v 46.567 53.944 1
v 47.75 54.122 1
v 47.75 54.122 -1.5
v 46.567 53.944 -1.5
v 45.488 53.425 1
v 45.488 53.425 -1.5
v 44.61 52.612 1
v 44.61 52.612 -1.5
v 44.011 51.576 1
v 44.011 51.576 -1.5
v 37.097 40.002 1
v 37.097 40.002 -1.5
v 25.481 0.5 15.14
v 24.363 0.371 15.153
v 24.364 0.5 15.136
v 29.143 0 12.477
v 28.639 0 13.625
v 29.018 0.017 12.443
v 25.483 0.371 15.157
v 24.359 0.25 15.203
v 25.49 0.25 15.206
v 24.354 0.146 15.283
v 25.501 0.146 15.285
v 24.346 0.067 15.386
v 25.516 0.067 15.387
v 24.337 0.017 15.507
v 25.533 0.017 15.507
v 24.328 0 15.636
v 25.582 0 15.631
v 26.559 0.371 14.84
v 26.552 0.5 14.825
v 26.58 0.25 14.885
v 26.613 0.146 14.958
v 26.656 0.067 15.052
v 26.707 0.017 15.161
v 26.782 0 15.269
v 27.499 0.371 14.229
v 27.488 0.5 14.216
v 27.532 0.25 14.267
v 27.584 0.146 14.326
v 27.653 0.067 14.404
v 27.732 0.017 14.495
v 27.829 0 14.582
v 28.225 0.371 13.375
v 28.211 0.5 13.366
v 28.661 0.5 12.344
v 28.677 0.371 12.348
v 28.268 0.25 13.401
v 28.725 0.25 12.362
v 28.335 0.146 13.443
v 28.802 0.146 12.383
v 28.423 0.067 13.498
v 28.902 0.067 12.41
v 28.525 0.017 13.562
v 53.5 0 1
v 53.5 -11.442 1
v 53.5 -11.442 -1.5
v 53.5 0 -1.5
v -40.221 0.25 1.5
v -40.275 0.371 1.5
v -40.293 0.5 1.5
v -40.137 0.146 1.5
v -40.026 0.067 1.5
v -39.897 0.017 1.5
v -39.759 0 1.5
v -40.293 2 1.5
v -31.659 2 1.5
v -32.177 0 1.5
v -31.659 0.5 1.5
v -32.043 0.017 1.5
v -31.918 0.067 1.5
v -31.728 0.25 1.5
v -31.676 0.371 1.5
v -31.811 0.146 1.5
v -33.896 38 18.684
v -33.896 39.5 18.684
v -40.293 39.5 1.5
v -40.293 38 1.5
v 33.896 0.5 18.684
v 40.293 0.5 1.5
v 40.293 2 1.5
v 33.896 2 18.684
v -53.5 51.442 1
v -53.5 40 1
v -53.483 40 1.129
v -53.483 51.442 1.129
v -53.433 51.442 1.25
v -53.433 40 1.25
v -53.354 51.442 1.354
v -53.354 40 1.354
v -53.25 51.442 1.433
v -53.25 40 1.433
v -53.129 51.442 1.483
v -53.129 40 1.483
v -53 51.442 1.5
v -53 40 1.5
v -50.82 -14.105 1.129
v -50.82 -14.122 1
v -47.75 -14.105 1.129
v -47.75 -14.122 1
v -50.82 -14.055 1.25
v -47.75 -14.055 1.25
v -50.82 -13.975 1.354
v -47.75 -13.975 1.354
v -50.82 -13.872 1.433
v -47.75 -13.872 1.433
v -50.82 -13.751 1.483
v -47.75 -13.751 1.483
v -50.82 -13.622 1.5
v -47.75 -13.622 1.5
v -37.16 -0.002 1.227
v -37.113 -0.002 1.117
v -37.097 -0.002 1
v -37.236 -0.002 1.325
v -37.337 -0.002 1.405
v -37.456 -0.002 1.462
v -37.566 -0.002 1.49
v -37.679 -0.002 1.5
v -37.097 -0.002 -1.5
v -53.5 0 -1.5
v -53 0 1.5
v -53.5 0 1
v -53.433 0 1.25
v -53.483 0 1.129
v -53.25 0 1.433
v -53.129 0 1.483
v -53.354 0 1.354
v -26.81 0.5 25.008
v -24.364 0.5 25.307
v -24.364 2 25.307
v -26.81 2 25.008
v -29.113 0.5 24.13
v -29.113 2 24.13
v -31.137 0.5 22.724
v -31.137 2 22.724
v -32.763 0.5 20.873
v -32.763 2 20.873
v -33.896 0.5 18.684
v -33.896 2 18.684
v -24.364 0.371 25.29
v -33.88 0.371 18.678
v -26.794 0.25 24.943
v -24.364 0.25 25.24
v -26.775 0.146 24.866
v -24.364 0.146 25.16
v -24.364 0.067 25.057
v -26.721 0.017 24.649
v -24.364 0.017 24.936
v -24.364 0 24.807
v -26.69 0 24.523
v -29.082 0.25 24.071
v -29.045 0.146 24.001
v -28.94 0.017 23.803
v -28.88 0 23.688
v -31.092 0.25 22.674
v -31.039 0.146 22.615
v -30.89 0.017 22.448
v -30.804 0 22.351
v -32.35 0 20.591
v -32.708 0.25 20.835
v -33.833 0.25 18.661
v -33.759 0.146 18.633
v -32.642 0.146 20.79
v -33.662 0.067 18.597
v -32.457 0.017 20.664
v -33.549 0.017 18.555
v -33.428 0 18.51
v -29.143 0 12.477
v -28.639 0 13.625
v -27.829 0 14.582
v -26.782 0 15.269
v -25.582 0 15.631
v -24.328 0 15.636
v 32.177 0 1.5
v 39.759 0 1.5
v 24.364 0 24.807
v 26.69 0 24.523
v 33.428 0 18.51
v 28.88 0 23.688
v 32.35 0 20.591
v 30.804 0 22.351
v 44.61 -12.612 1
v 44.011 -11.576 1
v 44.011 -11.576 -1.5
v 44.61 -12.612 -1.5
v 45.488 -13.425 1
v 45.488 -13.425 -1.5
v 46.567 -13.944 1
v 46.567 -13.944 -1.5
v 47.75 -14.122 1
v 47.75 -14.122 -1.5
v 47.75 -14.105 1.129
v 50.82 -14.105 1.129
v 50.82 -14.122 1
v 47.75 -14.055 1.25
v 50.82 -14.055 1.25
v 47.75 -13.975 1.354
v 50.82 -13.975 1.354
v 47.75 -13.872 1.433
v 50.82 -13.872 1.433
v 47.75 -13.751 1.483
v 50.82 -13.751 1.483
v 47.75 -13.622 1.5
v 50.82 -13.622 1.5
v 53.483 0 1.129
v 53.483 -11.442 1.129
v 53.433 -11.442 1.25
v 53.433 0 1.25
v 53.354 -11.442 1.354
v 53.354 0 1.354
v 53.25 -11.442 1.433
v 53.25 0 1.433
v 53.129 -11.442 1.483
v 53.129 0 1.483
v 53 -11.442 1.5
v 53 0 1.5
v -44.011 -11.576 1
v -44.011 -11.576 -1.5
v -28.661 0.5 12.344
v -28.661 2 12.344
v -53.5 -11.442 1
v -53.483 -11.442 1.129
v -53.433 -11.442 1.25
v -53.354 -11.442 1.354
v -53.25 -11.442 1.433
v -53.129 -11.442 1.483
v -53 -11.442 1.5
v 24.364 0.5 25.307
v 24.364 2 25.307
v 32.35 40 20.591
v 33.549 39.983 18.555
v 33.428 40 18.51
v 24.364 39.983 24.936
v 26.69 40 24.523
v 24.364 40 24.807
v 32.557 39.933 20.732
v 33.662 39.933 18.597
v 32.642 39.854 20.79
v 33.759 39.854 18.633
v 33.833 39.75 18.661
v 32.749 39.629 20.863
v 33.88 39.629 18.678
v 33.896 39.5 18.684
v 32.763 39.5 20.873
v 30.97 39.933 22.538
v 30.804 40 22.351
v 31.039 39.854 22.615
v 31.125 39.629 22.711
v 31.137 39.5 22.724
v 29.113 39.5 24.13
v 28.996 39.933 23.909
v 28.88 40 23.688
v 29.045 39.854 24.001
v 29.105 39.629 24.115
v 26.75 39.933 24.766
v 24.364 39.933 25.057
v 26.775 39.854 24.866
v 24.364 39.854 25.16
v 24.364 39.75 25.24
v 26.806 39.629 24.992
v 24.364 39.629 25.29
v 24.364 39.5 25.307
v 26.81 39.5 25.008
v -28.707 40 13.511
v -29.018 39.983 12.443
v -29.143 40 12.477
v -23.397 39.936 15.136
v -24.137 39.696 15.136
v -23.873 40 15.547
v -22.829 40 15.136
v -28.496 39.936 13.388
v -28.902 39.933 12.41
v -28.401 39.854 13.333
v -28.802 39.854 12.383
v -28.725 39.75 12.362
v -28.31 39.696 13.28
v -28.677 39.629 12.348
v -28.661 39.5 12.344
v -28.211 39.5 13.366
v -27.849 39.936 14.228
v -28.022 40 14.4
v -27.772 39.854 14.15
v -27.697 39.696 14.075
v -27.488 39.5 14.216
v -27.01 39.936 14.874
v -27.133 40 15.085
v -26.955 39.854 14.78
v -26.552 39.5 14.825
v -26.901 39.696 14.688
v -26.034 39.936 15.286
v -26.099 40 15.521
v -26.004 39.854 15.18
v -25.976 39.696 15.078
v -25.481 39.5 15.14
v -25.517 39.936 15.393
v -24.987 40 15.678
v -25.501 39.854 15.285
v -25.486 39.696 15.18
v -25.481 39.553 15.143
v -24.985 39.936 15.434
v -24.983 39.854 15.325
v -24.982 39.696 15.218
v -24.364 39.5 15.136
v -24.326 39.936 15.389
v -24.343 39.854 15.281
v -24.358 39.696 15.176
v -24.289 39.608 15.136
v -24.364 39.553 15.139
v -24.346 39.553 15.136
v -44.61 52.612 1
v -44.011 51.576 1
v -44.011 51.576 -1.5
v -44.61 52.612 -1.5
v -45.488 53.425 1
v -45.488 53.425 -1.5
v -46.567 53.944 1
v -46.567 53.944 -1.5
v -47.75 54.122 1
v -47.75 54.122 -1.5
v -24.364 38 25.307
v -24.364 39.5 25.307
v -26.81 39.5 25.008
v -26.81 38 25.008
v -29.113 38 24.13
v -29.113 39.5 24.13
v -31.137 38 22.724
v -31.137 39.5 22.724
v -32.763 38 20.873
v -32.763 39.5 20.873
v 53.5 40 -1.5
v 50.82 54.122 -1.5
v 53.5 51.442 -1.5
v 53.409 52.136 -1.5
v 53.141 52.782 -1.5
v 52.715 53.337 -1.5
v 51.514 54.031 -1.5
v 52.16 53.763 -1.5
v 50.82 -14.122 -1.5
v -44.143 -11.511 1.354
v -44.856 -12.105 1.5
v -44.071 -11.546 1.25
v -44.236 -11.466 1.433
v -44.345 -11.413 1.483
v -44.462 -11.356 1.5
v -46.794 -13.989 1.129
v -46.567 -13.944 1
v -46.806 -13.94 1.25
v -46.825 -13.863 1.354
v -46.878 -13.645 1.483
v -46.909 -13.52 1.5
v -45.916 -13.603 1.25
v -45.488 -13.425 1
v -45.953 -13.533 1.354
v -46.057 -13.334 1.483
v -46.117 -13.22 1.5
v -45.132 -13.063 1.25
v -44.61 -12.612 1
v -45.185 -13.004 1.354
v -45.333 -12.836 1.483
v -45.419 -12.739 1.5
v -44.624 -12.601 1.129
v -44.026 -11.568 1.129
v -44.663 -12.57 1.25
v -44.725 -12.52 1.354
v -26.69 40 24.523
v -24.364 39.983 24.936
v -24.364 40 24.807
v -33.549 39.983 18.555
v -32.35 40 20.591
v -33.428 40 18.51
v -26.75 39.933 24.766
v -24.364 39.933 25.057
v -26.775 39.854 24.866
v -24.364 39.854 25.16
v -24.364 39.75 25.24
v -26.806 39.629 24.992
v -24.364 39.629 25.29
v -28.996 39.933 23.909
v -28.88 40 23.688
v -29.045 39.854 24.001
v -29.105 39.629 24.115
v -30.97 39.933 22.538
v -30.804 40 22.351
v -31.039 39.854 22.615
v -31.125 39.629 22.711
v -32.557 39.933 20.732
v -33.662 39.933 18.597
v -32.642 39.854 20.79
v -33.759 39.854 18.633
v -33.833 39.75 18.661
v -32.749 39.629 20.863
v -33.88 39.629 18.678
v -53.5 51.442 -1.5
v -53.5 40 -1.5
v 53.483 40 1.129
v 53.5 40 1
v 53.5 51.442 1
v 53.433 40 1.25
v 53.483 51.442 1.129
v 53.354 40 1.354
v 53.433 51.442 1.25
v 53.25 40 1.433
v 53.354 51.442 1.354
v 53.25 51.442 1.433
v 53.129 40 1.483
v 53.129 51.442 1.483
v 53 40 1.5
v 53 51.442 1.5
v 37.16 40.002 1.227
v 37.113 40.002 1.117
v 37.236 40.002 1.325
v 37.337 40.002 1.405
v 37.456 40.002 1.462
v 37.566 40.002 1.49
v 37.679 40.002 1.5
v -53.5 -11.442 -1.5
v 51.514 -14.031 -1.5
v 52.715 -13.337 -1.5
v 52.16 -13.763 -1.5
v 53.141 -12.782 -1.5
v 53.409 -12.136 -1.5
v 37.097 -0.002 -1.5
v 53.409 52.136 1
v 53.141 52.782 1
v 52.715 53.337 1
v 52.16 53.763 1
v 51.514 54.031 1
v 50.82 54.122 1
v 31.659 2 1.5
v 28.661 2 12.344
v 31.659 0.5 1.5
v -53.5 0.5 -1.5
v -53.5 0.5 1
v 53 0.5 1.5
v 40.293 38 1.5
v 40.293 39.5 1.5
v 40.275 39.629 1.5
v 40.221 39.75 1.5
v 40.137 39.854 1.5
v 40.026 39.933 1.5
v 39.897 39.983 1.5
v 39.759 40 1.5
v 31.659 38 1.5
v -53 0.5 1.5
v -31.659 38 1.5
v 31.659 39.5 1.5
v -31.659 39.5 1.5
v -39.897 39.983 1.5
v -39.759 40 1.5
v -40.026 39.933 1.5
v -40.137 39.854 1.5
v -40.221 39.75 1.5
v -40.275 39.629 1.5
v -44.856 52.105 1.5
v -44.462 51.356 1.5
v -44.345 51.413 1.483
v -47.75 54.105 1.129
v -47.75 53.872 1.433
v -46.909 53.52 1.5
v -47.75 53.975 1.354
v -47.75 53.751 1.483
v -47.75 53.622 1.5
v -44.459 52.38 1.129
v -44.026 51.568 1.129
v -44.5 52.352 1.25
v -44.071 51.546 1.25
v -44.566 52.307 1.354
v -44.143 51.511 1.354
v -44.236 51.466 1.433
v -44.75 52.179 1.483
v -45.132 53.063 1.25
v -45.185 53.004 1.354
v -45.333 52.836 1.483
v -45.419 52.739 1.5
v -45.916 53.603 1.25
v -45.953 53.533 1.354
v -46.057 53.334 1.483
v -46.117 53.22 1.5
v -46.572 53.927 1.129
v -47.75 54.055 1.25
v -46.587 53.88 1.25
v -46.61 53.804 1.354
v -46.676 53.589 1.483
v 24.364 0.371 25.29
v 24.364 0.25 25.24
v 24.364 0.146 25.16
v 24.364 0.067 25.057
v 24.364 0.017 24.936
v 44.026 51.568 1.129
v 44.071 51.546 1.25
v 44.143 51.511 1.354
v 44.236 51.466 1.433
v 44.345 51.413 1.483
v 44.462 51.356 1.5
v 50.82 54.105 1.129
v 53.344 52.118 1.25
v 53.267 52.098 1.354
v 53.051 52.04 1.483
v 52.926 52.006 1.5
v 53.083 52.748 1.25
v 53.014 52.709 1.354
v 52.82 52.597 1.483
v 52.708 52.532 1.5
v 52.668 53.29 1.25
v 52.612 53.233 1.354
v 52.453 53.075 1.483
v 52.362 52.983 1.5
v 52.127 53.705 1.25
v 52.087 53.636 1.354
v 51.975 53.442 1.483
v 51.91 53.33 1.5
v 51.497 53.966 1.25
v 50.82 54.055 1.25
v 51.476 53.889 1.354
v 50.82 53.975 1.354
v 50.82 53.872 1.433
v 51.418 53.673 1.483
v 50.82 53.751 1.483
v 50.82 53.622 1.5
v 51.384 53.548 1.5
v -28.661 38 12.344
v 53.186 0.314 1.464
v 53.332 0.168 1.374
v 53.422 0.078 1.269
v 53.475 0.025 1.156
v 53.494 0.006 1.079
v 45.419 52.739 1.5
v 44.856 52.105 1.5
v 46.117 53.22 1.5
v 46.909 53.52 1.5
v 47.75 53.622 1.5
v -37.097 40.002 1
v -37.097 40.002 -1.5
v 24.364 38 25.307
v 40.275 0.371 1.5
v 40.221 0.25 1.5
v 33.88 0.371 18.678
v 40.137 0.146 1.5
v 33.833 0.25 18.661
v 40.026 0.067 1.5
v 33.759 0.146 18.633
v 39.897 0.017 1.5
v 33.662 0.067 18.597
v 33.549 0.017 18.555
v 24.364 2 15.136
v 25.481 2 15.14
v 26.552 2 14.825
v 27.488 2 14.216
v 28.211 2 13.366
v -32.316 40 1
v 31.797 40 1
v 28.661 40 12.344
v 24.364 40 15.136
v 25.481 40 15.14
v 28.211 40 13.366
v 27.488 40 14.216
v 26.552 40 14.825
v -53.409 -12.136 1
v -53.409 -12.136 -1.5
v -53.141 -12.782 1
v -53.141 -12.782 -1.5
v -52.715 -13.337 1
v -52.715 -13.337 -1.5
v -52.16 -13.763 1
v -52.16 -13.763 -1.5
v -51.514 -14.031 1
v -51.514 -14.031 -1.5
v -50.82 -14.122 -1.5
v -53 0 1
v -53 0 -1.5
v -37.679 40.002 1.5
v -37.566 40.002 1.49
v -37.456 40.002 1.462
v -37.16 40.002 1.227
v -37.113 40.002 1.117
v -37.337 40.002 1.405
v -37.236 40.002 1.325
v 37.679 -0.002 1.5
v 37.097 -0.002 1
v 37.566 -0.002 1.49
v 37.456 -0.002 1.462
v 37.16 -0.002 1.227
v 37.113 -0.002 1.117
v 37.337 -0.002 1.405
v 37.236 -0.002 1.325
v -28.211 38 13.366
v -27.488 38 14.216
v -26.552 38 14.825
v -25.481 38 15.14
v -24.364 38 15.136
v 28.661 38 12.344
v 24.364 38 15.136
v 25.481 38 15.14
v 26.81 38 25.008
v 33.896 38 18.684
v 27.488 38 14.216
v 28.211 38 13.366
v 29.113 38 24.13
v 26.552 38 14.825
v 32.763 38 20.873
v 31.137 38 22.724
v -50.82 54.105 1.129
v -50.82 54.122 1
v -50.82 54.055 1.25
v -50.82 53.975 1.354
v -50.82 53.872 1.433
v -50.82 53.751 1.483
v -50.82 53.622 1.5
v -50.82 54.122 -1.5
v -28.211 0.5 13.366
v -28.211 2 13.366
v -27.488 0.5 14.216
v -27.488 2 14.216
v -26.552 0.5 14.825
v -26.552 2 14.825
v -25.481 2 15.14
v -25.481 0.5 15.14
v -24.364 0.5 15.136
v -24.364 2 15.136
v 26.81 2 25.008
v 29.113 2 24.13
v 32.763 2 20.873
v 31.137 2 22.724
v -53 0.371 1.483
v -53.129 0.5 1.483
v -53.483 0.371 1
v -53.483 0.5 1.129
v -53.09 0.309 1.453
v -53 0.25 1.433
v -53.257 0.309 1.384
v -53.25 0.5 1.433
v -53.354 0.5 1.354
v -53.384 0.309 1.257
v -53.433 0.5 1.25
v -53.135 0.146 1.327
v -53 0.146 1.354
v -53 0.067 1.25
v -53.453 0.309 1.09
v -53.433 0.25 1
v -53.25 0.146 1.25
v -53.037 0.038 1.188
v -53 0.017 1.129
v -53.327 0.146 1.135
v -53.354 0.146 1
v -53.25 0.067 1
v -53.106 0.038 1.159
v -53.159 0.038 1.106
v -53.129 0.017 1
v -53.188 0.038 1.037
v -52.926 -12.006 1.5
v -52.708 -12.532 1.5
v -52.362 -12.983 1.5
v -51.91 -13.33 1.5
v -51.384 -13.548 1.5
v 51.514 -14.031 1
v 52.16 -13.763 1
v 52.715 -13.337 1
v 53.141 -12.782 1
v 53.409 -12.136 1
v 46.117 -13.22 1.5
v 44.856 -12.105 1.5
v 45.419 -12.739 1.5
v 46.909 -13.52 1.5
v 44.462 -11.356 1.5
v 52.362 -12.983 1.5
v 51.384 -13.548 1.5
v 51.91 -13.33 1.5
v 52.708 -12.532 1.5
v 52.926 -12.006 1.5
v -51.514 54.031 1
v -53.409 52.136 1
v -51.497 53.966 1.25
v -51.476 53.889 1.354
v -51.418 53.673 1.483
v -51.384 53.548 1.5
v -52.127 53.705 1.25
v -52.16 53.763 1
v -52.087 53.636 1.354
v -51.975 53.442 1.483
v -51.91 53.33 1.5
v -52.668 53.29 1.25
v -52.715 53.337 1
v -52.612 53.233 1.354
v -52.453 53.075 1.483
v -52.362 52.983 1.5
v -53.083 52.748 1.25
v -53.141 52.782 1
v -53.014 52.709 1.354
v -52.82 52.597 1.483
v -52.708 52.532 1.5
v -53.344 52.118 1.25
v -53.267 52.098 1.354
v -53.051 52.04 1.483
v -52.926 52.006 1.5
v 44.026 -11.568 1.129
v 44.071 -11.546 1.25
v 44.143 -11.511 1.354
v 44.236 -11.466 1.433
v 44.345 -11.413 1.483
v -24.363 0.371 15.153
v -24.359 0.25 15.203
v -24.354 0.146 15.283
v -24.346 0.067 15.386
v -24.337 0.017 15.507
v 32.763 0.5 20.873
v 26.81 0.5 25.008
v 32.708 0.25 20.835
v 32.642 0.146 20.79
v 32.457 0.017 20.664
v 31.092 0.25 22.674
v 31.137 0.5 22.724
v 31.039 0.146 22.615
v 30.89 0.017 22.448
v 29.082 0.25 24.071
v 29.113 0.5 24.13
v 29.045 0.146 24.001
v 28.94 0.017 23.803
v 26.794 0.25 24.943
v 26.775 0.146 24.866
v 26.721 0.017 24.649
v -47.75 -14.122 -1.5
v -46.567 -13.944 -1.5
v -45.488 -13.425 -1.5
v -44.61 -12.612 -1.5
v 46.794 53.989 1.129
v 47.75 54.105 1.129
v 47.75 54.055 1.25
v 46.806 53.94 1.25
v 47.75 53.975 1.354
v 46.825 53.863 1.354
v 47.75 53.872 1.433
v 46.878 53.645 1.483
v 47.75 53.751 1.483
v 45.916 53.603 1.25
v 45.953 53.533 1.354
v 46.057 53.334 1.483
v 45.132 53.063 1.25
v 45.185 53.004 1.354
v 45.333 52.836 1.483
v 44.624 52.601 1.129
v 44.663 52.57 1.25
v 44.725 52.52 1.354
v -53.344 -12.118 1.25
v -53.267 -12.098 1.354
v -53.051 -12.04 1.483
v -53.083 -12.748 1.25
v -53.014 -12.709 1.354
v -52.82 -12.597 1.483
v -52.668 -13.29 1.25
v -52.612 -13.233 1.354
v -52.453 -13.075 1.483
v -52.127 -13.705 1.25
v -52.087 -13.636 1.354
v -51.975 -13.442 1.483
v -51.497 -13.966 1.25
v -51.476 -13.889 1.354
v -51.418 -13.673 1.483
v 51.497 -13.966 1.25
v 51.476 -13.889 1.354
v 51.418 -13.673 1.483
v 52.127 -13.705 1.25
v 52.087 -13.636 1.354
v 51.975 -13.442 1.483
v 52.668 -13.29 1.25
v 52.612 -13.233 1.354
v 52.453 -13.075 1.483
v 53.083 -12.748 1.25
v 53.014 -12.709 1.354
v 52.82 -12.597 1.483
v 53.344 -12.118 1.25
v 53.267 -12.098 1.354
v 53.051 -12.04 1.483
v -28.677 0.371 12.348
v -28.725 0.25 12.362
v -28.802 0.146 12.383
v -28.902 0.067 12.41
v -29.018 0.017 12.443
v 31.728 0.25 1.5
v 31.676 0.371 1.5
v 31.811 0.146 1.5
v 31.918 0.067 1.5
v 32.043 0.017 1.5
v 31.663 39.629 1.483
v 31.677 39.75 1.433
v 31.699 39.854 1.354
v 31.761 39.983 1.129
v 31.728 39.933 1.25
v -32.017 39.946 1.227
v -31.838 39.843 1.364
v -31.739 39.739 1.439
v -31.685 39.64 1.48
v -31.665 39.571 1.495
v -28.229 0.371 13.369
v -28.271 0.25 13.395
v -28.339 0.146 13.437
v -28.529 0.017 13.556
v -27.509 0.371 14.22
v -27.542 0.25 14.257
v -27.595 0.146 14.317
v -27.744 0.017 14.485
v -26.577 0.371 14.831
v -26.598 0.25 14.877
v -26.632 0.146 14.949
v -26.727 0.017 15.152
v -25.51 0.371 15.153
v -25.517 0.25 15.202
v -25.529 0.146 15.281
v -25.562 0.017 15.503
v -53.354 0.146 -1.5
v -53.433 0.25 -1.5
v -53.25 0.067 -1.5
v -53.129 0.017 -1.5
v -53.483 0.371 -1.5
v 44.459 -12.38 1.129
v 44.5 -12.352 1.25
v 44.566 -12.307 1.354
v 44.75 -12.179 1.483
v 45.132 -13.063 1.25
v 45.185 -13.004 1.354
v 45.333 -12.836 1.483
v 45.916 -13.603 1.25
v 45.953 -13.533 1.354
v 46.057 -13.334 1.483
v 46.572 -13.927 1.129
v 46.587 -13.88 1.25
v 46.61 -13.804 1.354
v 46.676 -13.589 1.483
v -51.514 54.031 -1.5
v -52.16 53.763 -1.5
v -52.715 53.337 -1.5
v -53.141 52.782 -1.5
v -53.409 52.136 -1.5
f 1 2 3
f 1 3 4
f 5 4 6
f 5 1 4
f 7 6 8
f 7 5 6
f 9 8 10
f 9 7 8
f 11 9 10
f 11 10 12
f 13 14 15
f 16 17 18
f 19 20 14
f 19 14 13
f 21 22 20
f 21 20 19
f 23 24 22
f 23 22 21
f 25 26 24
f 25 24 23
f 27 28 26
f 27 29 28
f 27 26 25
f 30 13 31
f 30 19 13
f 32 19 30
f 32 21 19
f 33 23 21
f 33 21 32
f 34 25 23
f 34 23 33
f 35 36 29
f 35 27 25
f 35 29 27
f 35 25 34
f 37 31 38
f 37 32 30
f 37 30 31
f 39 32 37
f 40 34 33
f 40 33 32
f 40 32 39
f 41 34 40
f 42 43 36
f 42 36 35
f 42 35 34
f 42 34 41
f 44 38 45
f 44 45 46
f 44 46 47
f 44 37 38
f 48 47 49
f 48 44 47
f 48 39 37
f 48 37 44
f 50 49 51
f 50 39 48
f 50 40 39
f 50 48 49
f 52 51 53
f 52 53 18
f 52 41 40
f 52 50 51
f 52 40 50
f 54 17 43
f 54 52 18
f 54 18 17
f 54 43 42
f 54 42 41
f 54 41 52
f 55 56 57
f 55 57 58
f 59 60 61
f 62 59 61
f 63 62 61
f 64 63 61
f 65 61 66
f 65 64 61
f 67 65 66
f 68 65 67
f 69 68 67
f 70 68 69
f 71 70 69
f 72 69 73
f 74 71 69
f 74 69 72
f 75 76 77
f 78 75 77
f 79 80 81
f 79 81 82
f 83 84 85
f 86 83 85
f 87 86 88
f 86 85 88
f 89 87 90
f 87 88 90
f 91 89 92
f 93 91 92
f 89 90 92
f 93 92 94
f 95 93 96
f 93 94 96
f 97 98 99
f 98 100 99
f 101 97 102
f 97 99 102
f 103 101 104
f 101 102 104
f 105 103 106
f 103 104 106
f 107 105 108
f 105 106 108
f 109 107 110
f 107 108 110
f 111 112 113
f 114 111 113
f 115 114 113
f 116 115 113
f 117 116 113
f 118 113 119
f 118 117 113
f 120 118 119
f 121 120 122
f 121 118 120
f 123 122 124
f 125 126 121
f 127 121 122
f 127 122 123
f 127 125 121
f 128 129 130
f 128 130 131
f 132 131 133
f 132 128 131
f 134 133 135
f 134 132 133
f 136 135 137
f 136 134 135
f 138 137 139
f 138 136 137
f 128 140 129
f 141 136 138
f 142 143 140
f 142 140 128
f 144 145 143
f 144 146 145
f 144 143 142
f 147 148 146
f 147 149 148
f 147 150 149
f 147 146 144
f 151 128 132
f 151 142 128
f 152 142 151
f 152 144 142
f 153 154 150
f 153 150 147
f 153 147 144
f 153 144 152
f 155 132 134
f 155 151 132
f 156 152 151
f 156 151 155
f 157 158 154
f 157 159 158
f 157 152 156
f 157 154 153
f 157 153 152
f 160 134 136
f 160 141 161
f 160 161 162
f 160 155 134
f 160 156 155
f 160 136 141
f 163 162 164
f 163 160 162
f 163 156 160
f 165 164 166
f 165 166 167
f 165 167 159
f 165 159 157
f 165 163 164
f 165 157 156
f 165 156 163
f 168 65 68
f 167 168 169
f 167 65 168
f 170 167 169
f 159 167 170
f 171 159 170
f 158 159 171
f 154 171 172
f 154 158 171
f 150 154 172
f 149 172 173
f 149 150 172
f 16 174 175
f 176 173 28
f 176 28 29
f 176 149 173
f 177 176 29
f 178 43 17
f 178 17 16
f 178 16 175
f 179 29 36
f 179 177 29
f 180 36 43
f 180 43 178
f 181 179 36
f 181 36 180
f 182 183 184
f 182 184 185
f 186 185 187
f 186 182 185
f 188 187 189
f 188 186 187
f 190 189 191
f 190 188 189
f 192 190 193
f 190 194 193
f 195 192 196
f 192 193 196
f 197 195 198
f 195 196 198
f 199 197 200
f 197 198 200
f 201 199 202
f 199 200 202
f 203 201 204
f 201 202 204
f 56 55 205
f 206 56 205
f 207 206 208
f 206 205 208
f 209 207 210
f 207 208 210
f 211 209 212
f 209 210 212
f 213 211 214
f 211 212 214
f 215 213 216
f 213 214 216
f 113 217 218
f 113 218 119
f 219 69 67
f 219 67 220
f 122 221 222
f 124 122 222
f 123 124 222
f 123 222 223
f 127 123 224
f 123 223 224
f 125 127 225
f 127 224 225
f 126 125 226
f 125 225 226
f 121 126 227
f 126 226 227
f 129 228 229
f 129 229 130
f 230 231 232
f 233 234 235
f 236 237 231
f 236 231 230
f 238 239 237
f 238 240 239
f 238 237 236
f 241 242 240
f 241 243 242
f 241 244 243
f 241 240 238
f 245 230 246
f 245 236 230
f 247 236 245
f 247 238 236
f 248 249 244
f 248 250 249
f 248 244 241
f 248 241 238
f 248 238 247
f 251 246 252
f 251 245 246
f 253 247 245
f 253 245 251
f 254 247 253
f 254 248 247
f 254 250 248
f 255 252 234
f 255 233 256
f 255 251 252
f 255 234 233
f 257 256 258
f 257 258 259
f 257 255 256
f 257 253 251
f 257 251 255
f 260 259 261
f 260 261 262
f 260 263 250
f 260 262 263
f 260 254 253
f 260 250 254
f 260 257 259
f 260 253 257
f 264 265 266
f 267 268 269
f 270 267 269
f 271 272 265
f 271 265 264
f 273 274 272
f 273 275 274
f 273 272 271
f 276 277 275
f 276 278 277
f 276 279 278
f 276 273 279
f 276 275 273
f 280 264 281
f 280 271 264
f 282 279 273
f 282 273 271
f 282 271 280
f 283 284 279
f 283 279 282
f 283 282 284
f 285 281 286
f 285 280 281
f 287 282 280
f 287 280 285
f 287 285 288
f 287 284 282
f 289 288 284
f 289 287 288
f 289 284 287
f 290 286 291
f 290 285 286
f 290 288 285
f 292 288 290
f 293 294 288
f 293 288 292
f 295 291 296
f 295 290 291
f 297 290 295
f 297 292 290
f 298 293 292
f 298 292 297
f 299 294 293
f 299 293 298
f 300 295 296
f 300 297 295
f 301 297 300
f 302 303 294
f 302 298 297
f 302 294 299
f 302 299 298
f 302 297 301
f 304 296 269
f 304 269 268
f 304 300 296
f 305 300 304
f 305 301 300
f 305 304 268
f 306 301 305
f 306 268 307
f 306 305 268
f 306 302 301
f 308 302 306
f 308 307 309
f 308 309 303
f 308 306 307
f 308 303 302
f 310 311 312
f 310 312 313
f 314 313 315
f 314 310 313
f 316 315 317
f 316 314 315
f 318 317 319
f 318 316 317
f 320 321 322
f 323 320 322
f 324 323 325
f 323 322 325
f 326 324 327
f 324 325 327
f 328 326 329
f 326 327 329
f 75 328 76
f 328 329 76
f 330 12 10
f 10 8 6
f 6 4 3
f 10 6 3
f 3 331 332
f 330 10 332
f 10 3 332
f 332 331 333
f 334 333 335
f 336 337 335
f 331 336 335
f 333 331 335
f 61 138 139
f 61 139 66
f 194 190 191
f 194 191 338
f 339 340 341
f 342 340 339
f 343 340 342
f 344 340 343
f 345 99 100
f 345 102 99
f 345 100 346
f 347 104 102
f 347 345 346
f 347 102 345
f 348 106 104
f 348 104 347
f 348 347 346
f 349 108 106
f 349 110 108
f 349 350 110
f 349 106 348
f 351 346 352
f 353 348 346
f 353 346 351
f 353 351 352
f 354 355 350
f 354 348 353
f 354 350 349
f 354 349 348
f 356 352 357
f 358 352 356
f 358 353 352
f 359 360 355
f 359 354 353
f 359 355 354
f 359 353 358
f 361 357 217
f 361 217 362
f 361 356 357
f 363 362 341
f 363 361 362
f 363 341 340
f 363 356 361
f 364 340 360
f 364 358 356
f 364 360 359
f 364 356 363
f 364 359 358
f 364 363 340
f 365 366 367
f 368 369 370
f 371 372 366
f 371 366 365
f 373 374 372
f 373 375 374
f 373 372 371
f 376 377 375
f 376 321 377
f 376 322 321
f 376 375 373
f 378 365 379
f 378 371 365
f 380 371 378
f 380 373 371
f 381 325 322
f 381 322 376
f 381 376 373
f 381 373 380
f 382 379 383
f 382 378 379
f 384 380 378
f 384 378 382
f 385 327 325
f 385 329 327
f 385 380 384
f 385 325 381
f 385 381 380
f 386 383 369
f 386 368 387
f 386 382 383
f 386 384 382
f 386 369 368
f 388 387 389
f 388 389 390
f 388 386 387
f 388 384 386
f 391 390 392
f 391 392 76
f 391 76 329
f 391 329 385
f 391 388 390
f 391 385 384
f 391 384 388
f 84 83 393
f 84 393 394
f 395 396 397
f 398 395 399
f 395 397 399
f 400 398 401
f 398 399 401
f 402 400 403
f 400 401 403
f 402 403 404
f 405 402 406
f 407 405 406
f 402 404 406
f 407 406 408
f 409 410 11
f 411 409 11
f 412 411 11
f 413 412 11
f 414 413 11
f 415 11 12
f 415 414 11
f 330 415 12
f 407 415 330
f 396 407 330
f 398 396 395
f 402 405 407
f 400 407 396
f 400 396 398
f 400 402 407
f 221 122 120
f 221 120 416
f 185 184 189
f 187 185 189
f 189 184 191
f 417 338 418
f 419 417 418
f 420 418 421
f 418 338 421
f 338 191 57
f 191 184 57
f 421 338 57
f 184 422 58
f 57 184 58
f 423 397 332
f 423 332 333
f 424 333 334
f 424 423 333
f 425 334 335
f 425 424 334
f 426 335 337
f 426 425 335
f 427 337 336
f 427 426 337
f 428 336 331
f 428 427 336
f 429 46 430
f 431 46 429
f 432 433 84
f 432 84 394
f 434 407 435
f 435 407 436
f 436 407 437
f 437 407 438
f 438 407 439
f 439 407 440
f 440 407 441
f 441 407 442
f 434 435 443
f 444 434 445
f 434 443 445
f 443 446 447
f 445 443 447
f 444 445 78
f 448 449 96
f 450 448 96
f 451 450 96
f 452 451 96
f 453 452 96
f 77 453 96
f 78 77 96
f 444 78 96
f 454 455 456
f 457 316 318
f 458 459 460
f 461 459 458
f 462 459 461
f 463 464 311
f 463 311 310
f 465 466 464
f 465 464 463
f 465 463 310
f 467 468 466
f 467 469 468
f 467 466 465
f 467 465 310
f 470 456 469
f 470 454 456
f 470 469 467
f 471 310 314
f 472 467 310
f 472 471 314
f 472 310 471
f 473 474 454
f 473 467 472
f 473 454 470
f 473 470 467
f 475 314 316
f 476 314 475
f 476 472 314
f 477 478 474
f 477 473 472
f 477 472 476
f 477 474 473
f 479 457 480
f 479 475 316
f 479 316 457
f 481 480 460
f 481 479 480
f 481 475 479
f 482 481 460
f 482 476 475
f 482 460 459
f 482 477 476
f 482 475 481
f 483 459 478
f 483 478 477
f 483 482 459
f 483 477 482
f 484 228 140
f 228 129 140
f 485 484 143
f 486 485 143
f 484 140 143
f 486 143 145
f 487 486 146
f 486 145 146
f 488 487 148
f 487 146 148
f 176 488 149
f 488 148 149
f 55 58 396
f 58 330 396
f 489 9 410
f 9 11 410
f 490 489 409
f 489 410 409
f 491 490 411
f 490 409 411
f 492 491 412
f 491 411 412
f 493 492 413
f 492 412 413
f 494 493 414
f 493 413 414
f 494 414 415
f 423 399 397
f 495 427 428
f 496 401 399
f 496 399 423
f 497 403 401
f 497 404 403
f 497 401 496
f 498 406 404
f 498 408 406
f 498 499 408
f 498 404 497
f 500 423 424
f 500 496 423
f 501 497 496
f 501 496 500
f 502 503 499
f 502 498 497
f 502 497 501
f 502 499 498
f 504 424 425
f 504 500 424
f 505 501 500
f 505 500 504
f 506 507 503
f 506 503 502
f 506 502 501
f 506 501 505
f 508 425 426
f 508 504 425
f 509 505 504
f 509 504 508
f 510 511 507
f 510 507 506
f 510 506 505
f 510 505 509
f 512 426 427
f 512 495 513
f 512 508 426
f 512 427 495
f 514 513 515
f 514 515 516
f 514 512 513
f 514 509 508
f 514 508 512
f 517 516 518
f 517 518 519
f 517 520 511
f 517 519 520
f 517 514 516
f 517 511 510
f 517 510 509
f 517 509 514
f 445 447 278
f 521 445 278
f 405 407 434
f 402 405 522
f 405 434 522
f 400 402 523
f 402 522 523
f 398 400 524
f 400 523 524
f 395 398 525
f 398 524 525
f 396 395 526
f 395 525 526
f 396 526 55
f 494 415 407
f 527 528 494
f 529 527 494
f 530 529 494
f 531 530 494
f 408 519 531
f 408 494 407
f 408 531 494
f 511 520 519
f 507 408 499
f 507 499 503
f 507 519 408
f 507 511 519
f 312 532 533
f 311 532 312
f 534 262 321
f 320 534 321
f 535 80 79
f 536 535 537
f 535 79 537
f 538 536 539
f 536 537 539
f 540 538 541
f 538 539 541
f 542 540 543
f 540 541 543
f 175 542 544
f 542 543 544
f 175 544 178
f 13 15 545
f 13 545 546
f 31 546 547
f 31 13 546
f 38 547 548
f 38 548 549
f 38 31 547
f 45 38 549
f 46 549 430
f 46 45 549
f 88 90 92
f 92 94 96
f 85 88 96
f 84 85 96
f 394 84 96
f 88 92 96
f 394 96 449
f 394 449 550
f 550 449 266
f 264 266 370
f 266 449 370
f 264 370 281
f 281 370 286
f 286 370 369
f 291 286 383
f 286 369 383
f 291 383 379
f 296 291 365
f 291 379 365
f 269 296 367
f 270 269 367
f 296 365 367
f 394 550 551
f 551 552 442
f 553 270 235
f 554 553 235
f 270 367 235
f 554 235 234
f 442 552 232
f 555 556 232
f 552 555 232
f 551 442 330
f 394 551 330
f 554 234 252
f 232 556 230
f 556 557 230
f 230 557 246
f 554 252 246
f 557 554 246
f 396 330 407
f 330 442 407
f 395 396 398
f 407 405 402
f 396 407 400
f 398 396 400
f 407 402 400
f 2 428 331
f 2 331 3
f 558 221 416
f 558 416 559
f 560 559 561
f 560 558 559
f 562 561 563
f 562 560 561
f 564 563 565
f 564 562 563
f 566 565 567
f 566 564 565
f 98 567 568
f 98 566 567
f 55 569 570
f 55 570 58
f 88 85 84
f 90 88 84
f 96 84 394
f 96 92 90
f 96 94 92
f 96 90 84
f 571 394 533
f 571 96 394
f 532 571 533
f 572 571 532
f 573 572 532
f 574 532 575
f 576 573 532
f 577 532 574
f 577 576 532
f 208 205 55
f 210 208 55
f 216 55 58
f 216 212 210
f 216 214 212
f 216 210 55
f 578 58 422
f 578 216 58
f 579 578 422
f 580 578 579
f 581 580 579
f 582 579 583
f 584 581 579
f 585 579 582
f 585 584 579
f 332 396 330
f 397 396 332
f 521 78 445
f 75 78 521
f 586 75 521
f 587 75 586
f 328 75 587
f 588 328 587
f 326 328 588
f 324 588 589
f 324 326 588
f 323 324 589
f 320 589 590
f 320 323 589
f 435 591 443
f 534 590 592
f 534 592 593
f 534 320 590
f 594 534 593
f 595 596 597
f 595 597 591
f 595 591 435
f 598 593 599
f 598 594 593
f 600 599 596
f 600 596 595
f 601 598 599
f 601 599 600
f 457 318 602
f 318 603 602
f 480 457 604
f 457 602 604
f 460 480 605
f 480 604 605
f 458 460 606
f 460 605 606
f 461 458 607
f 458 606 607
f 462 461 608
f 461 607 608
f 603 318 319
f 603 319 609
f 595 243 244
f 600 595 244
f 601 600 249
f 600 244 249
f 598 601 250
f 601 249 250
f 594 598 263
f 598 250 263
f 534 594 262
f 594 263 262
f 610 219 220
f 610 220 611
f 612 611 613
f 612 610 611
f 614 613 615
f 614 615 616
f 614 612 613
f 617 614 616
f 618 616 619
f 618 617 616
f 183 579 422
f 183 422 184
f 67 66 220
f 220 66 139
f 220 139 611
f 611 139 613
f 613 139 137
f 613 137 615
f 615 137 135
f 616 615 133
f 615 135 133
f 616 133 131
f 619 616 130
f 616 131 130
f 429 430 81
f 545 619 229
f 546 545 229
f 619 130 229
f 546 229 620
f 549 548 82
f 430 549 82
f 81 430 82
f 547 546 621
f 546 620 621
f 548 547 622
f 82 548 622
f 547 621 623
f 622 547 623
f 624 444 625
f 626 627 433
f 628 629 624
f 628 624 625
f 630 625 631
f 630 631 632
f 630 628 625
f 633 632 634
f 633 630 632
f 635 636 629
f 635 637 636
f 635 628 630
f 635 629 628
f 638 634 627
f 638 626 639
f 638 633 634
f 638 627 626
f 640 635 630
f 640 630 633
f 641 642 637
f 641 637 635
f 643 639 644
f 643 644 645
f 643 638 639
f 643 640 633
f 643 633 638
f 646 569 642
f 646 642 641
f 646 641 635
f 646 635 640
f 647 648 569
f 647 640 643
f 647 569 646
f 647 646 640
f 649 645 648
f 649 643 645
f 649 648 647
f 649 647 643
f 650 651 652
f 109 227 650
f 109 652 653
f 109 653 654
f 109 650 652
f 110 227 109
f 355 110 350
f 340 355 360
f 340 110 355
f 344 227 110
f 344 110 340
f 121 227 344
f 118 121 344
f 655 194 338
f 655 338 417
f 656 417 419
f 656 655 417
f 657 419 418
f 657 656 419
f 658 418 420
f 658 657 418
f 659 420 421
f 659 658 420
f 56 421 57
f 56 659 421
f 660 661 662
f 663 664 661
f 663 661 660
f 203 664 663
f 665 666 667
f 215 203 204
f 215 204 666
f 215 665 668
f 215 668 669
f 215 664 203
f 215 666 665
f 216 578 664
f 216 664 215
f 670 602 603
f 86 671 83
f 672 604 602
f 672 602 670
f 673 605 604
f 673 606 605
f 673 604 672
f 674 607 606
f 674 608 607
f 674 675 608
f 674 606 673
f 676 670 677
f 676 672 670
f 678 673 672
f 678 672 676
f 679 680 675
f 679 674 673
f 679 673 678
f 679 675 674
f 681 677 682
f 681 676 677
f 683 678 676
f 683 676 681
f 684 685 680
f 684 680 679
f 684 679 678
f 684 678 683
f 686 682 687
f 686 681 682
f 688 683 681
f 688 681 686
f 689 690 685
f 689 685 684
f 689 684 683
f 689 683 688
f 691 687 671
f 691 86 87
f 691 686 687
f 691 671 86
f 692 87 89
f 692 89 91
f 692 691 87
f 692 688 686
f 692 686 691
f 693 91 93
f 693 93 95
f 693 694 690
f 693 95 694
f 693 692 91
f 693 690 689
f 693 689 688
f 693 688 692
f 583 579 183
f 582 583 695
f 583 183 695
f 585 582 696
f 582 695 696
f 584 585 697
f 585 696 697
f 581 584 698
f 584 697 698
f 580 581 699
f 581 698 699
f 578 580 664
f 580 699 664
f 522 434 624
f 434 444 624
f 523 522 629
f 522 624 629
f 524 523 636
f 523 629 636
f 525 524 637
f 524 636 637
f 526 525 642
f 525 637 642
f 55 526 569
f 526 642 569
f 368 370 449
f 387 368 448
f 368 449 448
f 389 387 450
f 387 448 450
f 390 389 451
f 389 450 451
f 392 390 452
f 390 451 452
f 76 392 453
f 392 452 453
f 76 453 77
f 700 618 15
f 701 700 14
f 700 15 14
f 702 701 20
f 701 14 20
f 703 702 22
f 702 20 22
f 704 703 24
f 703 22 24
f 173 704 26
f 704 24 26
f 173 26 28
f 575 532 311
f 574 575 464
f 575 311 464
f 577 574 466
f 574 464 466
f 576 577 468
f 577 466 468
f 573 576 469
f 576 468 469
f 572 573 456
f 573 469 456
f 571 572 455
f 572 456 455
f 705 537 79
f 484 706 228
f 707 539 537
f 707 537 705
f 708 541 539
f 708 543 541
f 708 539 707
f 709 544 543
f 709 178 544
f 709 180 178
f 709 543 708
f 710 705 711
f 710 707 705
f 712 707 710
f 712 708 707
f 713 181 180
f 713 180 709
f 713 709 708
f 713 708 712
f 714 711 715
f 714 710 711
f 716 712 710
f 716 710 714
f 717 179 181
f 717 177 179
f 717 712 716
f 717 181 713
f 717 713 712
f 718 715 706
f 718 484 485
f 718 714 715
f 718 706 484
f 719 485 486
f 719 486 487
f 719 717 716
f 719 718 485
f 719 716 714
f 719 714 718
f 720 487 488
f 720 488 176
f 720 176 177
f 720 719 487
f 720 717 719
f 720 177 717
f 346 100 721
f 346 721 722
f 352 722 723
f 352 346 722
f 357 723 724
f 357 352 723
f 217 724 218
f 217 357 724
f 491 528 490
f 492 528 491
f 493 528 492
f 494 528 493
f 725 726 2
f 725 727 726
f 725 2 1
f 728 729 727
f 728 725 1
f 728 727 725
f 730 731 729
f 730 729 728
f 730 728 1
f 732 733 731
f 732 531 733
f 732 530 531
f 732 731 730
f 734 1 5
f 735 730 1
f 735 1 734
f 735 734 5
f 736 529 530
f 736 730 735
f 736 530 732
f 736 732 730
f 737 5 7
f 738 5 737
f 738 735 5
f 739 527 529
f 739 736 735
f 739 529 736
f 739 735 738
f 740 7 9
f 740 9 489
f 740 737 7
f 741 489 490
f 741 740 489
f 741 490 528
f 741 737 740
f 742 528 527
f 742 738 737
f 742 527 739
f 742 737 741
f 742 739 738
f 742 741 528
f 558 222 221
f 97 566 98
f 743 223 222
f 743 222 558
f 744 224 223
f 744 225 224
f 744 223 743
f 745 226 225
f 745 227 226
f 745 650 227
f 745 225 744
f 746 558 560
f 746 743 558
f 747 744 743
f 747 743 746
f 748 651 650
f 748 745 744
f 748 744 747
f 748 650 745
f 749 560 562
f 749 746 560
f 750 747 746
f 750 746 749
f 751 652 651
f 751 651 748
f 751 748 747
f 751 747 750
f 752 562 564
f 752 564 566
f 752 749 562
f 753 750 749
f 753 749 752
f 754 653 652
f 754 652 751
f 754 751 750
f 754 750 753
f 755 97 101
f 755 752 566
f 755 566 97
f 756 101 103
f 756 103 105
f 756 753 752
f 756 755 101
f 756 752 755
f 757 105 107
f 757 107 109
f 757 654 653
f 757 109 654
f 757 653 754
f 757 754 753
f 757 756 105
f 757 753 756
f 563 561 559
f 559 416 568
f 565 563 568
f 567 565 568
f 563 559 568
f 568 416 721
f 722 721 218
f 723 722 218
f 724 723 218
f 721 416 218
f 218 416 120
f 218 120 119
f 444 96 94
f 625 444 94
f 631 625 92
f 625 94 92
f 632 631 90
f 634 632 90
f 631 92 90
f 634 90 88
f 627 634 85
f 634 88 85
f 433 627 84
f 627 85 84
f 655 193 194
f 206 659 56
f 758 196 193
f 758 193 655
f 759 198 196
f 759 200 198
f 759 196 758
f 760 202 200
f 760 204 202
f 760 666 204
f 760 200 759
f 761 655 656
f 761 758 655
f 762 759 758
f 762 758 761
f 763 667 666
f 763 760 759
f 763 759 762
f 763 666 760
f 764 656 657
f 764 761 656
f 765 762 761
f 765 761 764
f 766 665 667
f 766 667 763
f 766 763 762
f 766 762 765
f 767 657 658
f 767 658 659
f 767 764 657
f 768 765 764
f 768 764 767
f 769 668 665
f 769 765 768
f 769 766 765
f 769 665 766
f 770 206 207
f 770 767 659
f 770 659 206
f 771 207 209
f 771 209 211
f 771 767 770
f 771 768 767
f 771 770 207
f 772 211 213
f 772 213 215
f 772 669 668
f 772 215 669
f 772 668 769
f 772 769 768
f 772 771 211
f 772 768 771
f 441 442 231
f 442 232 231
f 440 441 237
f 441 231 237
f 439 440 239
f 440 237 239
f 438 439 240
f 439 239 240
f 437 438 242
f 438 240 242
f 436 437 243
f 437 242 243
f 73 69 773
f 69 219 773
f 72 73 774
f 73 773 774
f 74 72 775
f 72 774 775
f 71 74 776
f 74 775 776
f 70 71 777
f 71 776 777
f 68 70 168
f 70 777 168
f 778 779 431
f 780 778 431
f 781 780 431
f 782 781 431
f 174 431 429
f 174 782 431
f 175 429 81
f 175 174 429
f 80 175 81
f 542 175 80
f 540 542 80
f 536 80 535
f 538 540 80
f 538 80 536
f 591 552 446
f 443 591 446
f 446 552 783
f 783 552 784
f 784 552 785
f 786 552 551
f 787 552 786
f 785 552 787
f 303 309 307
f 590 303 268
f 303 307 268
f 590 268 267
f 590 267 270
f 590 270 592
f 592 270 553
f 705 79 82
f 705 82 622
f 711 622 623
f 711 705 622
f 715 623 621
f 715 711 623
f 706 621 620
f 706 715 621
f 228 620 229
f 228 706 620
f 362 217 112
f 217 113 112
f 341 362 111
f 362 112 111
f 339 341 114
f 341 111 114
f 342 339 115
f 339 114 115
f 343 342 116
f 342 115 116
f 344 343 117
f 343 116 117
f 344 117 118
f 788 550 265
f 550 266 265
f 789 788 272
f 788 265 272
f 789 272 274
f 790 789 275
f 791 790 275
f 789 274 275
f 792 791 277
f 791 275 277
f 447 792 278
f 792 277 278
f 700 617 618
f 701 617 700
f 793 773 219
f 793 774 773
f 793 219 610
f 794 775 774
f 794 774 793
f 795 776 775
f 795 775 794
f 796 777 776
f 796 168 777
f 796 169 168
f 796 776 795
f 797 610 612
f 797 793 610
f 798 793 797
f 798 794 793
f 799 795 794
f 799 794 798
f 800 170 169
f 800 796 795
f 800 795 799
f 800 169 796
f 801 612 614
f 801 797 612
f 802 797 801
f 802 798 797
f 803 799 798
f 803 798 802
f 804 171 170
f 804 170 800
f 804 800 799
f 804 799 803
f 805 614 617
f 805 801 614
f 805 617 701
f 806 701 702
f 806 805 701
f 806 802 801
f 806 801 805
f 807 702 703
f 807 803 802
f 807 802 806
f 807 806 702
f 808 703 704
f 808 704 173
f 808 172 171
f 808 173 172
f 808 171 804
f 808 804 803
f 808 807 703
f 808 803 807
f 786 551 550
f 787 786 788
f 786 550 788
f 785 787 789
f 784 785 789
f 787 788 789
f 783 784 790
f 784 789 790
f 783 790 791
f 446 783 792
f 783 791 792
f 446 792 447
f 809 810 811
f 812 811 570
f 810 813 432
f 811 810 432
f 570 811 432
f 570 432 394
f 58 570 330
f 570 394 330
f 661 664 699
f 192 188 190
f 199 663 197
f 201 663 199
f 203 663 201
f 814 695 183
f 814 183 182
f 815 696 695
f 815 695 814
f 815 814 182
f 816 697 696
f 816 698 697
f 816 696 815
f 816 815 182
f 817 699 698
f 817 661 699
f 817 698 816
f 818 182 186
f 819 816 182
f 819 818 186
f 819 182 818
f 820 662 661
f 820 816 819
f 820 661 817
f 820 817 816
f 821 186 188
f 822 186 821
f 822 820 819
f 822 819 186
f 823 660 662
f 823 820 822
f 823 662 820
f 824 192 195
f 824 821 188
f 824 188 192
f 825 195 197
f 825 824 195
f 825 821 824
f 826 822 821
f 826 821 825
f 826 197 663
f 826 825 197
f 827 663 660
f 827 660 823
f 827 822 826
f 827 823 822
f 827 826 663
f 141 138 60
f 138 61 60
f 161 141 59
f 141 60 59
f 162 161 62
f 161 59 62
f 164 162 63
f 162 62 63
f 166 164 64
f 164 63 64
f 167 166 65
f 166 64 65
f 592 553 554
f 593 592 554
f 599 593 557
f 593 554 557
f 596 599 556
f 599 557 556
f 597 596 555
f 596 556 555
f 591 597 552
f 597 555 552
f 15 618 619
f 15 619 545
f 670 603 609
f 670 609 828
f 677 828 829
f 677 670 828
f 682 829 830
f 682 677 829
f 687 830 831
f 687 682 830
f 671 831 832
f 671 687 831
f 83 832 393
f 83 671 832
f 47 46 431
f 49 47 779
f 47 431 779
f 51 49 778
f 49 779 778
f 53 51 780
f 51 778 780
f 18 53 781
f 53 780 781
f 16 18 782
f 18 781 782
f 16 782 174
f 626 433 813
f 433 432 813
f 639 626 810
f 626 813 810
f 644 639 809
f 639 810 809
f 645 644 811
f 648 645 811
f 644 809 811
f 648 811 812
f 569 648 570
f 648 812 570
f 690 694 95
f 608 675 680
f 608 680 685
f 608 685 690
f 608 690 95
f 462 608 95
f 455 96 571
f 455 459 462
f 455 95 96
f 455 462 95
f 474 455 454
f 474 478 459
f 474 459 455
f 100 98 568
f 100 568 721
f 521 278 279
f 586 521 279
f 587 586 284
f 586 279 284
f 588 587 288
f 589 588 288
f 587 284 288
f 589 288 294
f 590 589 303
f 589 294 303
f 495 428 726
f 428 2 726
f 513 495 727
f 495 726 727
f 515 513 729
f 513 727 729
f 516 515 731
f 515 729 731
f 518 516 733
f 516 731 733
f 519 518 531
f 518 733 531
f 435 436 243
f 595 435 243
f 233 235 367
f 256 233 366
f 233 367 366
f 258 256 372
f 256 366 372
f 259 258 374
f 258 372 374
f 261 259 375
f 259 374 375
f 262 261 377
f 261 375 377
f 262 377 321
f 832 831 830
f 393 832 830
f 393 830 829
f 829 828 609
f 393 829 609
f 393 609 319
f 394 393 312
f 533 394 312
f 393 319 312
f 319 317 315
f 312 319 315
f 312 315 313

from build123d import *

# Parameters (mm, degrees)
F1_DEPTH = 2
F2_DEPTH = 20
F5_DEPTH = 3
F6_R     = 0.5
F6_2_R   = 0.5
F7_R     = 0.5
F7_2_R   = 0.5
F7_3_R   = 0.5
F7_4_R   = 0.5
F7_5_R   = 0.5
F9_DEPTH = 0.1


with BuildPart() as f1:
    # F0 (on Front) → F1 (new body)
    with BuildSketch(Plane.XZ):
        with BuildLine():
            Line((31.6586345434, 1.5), (40.2928069234, 1.5))
            Line((40.2928069234, 1.5), (33.8961698165, 18.6841922669))
            ThreePointArc((33.8961698165, 18.6841922669), (30.1676737383, 23.4886986324), (24.3642989581, 25.3068860765))
            Line((24.3642989581, 25.3068860765), (0, 25.3068860765))
            Line((0, 25.3068860765), (-24.3642989581, 25.3068860765))
            ThreePointArc((-24.3642989581, 25.3068860765), (-30.1676737383, 23.4886986324), (-33.8961698165, 18.6841922669))
            Line((-33.8961698165, 18.6841922669), (-40.2928069234, 1.5))
            Line((-40.2928069234, 1.5), (-31.6586345434, 1.5))
            Line((-31.6586345434, 1.5), (-28.6606989536, 12.3438404575))
            ThreePointArc((-28.6606989536, 12.3438404575), (-27.0417999529, 14.5543863096), (-24.3642989581, 15.136052332))
            Line((-24.3642989581, 15.136052332), (0, 15.136052332))
            Line((0, 15.136052332), (24.3642989581, 15.136052332))
            ThreePointArc((24.3642989581, 15.136052332), (27.0417999529, 14.5543863096), (28.6606989536, 12.3438404575))
            Line((28.6606989536, 12.3438404575), (31.6586345434, 1.5))
        make_face()
    extrude(amount=-F1_DEPTH)


with BuildPart() as f2:
    # F0 (on Front) → F2 (new body)
    with BuildSketch(Plane.XZ):
        Polygon((-53.5, -1.5), (53.5, -1.5), (53.5, 1.5), (40.2928069234, 1.5), (31.6586345434, 1.5), (-31.6586345434, 1.5), (-40.2928069234, 1.5), (-53.5, 1.5), align=None)
    extrude(amount=-F2_DEPTH)



with BuildPart() as f2_1:
    add(f2.part)
    # F3: F1, F2 across face
    add(f1.part.mirror(Plane(origin=(0, 20, 0), x_dir=(1, 0, 0), z_dir=(0, 1, 0))))
    add(f2.part.mirror(Plane(origin=(0, 20, 0), x_dir=(1, 0, 0), z_dir=(0, 1, 0))))

    # F6#2
    f6_2_edges = [f2_1.edges().sort_by_distance(p)[0] for p in [
        (-53.5, 20, 1.5),
    ]]
    fillet(f6_2_edges, radius=F6_2_R)

    # F7#2
    f7_2_edges = [f2_1.edges().sort_by_distance(p)[0] for p in [
        (0, 40, 1.5),
        (-30.159667, 40, 6.92192),
        (-37.094488, 40, 10.092096),
        (53.5, 20, 1.5),
        (0.25, 0, 1.5),
    ]]
    fillet(f7_2_edges, radius=F7_2_R)

    # F8 (on face) → F9 (join)
    with BuildSketch(Plane.XY.offset(1.5)):
        Polygon((-53, 31.7278392613), (-53, 20.25), (-53, 8.7876711041), (53, 8.7876711041), (53, 31.7278392613), align=None)
    extrude(amount=-F9_DEPTH)


with BuildPart() as f5:
    # F4 (on face) → F5 (new body)
    with BuildSketch(Plane.XY.offset(1.5)):
        with BuildLine():
            Line((-53.5, 51.4421015978), (-53.5, 40))
            Line((-53.5, 40.0000000001), (-37.0968580246, 40.001589805))
            Line((-37.0968580246, 40.0015898049), (-44.0106317401, 51.5759587288))
            ThreePointArc((-44.0106317401, 51.5759587288), (-45.4883027253, 53.4249418645), (-47.7502972833, 54.1218140166))
            Line((-47.7502972833, 54.1218140166), (-50.8202875812, 54.1218140166))
            ThreePointArc((-50.8202875812, 54.1218140166), (-52.7151304042, 53.3369444208), (-53.5, 51.4421015978))
        make_face()
    extrude(amount=-F5_DEPTH)

    # F7
    f7_edges = [f5.edges().sort_by_distance(p)[0] for p in [
        (-53.5, 45.721051, 1.5),
        (-52.71513, 53.336944, 1.5),
        (-49.285292, 54.121814, 1.5),
        (-45.488303, 53.424942, 1.5),
        (-40.553745, 45.788774, 1.5),
    ]]
    fillet(f7_edges, radius=F7_R)


with BuildPart() as f5b:
    # F4 (on face) → F5, piece 2 (new body)
    with BuildSketch(Plane.XY.offset(1.5)):
        with BuildLine():
            Line((37.0968580246, 40.001589805), (53.5, 40.0000000001))
            Line((53.5, 40), (53.5, 51.4421015978))
            ThreePointArc((53.5, 51.4421015978), (52.7151304042, 53.3369444208), (50.8202875812, 54.1218140166))
            Line((50.8202875812, 54.1218140166), (47.7502972833, 54.1218140166))
            ThreePointArc((47.7502972833, 54.1218140166), (45.4883027253, 53.4249418645), (44.0106317401, 51.5759587288))
            Line((44.0106317401, 51.5759587288), (37.0968580246, 40.0015898049))
        make_face()
    extrude(amount=-F5_DEPTH)

    # F7#3
    f7_3_edges = [f5b.edges().sort_by_distance(p)[0] for p in [
        (53.5, 45.721051, 1.5),
        (52.71513, 53.336944, 1.5),
        (49.285292, 54.121814, 1.5),
        (45.488303, 53.424942, 1.5),
        (40.553745, 45.788774, 1.5),
    ]]
    fillet(f7_3_edges, radius=F7_3_R)


with BuildPart() as f5c:
    # F4 (on face) → F5, piece 3 (new body)
    with BuildSketch(Plane.XY.offset(1.5)):
        with BuildLine():
            Line((53.5, -11.4421015978), (53.5, 0))
            Line((53.5, 0), (37.0968580246, -0.0015898049))
            Line((37.0968580246, -0.0015898049), (44.0106317401, -11.5759587288))
            ThreePointArc((44.0106317401, -11.5759587288), (45.4883027253, -13.4249418645), (47.7502972833, -14.1218140166))
            Line((47.7502972833, -14.1218140166), (50.8202875812, -14.1218140166))
            ThreePointArc((50.8202875812, -14.1218140166), (52.7151304042, -13.3369444208), (53.5, -11.4421015978))
        make_face()
    extrude(amount=-F5_DEPTH)

    # F7#4
    f7_4_edges = [f5c.edges().sort_by_distance(p)[0] for p in [
        (53.5, -5.721051, 1.5),
        (40.553745, -5.788774, 1.5),
    ]]
    fillet(f7_4_edges, radius=F7_4_R)


with BuildPart() as f5d:
    # F4 (on face) → F5, piece 4 (new body)
    with BuildSketch(Plane.XY.offset(1.5)):
        with BuildLine():
            Line((-37.0968580246, -0.0015898049), (-53.5, 0))
            Line((-53.5, 0), (-53.5, -11.4421015978))
            ThreePointArc((-53.5, -11.4421015978), (-52.7151304042, -13.3369444208), (-50.8202875812, -14.1218140166))
            Line((-50.8202875812, -14.1218140166), (-47.7502972833, -14.1218140166))
            ThreePointArc((-47.7502972833, -14.1218140166), (-45.4883027253, -13.4249418645), (-44.0106317401, -11.5759587288))
            Line((-44.0106317401, -11.5759587288), (-37.0968580246, -0.0015898049))
        make_face()
    extrude(amount=-F5_DEPTH)

    # F6
    f6_edges = [f5d.edges().sort_by_distance(p)[0] for p in [
        (-40.553745, -5.788774, 1.5),
        (-45.488303, -13.424942, 1.5),
        (-49.285292, -14.121814, 1.5),
        (-52.71513, -13.336944, 1.5),
        (-53.5, -5.721051, 1.5),
    ]]
    fillet(f6_edges, radius=F6_R)


with BuildPart() as f1_1:
    add(f1.part)

    # F7#5
    f7_5_edges = [f1_1.edges().sort_by_distance(p)[0] for p in [
        (37.094488, 0, 10.092096),
        (30.159667, 0, 6.92192),
        (27.0418, 0, 14.554386),
        (0, 0, 15.136052),
        (-30.159667, 0, 6.92192),
        (-27.0418, 0, 14.554386),
    ]]
    fillet(f7_5_edges, radius=F7_5_R)


solid = Compound([f2_1.part, f5.part, f5b.part, f5c.part, f5d.part, f1_1.part])
